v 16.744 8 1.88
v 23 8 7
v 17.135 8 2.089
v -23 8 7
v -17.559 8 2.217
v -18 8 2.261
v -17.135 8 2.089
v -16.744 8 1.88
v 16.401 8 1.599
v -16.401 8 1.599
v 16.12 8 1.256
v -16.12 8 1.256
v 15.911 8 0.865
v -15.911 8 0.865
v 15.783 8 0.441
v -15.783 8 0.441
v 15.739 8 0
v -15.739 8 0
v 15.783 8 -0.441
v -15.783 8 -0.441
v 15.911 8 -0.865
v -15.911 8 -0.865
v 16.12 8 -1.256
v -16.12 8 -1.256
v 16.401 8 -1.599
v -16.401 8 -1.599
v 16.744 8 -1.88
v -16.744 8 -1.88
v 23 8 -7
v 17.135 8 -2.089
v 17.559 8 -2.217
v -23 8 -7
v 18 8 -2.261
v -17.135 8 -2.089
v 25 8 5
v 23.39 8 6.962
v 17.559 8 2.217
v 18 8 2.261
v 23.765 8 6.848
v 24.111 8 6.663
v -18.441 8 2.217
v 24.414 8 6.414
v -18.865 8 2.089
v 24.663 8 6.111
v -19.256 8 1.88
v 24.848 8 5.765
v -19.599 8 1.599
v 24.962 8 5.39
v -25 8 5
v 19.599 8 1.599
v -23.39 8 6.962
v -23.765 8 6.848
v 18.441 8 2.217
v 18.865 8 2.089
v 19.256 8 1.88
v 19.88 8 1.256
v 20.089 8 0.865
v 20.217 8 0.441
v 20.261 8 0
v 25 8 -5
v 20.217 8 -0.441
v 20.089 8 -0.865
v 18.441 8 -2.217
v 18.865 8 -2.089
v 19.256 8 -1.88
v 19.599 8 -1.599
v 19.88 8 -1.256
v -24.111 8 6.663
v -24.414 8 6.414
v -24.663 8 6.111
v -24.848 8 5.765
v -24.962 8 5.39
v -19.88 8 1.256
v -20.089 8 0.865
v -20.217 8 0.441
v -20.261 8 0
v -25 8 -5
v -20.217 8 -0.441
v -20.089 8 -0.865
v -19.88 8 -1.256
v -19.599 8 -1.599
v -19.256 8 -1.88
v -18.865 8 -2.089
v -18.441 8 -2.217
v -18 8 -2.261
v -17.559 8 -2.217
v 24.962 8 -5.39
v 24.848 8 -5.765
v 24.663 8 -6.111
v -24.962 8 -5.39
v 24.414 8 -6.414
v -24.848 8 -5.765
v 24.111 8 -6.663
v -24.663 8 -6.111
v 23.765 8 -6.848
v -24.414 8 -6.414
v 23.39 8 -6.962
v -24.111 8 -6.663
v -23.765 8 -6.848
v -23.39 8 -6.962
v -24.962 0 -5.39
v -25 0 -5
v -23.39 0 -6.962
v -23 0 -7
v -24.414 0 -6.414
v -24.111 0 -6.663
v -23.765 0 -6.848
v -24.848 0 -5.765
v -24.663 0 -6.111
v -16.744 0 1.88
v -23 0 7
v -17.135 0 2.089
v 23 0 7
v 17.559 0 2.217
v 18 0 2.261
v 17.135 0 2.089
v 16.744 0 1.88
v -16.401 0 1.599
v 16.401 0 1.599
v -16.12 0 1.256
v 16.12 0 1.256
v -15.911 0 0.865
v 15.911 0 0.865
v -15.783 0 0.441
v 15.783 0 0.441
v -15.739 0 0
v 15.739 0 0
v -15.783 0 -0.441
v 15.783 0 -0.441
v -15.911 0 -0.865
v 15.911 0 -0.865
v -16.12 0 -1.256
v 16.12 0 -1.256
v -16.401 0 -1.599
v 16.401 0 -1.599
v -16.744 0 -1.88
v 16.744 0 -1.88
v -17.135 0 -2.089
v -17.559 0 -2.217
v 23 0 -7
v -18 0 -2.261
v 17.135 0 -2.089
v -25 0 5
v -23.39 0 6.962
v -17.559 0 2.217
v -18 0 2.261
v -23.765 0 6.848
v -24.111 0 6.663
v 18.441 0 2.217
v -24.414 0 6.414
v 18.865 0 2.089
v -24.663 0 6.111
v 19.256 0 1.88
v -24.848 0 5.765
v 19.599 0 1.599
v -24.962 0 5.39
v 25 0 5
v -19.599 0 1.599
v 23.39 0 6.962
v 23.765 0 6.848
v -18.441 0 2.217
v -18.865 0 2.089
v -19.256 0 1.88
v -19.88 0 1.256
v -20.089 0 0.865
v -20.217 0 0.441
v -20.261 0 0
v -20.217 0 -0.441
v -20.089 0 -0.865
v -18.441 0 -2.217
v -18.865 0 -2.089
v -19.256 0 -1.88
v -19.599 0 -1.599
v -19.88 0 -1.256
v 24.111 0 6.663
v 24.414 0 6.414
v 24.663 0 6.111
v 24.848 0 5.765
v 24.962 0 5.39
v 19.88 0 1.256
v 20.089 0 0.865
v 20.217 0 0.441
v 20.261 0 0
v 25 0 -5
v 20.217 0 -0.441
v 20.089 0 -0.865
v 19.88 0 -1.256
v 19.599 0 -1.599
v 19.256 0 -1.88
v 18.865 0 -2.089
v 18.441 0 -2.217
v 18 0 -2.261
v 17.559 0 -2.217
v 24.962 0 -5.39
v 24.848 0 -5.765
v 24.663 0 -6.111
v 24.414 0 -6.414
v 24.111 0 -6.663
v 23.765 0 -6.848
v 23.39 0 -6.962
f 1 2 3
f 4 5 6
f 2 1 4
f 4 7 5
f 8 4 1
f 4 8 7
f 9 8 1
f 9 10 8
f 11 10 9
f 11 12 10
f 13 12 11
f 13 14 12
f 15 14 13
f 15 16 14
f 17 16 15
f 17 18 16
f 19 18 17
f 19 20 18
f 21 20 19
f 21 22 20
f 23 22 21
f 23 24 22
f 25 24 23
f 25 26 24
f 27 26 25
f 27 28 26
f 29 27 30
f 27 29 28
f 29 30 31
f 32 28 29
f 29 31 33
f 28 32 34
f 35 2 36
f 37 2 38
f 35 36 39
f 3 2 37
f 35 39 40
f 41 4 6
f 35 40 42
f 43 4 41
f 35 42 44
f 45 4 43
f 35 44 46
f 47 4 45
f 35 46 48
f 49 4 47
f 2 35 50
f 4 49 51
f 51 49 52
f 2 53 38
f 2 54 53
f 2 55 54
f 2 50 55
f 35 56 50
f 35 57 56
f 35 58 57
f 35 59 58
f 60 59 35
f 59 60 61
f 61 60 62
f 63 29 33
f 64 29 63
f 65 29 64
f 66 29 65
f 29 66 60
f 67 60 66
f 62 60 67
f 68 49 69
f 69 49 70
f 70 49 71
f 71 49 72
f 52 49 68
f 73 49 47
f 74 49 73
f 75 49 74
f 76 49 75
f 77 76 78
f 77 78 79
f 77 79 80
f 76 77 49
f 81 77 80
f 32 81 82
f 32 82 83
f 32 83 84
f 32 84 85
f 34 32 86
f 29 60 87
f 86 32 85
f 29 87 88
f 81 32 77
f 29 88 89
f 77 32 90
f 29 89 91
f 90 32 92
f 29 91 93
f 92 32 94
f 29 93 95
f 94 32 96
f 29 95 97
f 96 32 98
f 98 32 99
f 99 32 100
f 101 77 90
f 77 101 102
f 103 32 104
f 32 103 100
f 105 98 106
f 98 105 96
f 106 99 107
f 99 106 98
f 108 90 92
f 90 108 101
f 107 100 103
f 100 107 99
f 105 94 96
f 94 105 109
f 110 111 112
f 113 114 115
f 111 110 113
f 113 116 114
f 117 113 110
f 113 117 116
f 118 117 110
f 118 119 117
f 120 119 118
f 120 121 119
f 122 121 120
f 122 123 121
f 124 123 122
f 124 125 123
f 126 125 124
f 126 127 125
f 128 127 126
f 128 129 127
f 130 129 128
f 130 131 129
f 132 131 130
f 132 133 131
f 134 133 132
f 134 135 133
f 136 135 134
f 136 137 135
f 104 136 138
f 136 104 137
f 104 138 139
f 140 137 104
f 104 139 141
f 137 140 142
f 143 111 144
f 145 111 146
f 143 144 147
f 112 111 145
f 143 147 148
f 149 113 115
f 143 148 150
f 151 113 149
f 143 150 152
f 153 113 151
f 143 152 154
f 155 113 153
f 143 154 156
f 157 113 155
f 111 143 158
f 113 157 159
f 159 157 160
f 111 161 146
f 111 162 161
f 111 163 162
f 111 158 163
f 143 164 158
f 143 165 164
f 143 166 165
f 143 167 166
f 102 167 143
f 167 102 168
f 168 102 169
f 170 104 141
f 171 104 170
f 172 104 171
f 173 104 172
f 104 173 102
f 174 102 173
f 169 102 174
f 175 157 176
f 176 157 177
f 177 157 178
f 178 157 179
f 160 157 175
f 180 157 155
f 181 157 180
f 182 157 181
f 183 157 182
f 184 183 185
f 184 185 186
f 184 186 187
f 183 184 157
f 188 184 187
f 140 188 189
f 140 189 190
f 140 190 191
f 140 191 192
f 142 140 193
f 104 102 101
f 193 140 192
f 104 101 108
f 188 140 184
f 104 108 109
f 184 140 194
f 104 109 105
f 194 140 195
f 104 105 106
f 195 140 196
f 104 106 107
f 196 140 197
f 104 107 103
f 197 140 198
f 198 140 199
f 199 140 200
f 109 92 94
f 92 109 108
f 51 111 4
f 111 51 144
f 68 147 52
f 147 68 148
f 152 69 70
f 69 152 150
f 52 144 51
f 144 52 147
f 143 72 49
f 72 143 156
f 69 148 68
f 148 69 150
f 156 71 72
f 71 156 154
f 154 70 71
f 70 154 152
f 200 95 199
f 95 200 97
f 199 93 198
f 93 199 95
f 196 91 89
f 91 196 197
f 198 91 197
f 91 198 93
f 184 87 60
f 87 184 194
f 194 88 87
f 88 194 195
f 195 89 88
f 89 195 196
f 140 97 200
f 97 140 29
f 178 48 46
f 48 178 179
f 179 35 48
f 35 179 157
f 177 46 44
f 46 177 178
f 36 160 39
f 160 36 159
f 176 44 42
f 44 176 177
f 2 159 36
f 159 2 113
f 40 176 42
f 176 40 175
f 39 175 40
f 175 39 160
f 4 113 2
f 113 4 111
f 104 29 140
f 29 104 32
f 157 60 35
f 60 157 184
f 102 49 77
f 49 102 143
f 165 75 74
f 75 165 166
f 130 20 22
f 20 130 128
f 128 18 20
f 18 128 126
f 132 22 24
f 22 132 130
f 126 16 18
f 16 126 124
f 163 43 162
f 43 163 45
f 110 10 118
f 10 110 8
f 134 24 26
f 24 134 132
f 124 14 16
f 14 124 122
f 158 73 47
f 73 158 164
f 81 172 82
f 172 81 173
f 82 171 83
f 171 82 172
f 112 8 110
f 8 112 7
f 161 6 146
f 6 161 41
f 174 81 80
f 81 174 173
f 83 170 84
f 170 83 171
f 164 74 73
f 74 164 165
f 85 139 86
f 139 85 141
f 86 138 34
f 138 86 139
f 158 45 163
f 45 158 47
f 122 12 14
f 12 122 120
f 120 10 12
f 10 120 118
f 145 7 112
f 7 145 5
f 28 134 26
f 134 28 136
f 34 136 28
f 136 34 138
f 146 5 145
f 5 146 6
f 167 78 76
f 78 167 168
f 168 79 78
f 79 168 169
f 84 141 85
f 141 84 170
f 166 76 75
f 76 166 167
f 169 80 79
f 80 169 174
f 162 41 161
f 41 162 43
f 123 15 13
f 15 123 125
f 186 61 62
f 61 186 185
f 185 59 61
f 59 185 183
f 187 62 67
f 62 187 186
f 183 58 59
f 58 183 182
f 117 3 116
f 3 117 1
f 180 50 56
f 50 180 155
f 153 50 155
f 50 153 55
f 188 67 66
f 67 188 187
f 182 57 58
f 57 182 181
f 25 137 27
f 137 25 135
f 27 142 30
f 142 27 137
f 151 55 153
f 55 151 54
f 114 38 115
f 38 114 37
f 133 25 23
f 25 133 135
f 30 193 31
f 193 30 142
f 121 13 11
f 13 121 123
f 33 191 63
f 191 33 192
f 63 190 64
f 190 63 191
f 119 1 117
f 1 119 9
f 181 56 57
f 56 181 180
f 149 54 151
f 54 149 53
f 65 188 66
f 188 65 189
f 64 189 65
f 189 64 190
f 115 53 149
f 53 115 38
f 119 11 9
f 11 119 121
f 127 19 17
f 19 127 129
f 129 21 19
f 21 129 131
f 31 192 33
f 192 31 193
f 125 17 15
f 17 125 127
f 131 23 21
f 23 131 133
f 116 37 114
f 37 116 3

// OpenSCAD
// Sandwich the existing metal TD04A bracket, not the sensor body.
width=50; height=14; thick=8; bolt_pitch=36; bolt_d=4.5;
$fn=48;
assert(bolt_pitch/2-bolt_d/2>12+2);
difference(){
 translate([-width/2,0,-height/2])rb([width,thick,height],2,"y");
 for(x=[-bolt_pitch/2,bolt_pitch/2])translate([x,-.02,0])rotate([-90,0,0])cylinder(d=bolt_d/cos(180/32),h=thick+.04,$fn=32);
}

// Rounded profile extrusions preserve planar mating faces and bed contact.
module rz(s,r){
 assert(r>0 && 2*r<min(s[0],s[1]));
 union(){
  translate([r,0,0])cube([s[0]-2*r,s[1],s[2]]);
  translate([0,r,0])cube([s[0],s[1]-2*r,s[2]]);
  for(x=[r,s[0]-r],y=[r,s[1]-r])translate([x,y,0])cylinder(r=r,h=s[2],$fn=32);
 }
}
module rb(s,r=2,axis="z"){
 if(axis=="z")rz(s,r);
 if(axis=="y")translate([0,s[1],0])rotate([90,0,0])rz([s[0],s[2],s[1]],r);
 if(axis=="x")translate([0,0,s[2]])rotate([0,90,0])rz([s[2],s[1],s[0]],r);
}
// +X peak; rotate in bore plane so peak points upward in the supplied print STL.
module roof(d,h,angle=0){
 r=d/2/cos(180/32);
 rotate([0,0,angle])linear_extrude(height=h)union(){
  circle(r=r,$fn=32);
  polygon([[r/sqrt(2),-r/sqrt(2)],[sqrt(2)*r,0],[r/sqrt(2),r/sqrt(2)]]);
 }
}
